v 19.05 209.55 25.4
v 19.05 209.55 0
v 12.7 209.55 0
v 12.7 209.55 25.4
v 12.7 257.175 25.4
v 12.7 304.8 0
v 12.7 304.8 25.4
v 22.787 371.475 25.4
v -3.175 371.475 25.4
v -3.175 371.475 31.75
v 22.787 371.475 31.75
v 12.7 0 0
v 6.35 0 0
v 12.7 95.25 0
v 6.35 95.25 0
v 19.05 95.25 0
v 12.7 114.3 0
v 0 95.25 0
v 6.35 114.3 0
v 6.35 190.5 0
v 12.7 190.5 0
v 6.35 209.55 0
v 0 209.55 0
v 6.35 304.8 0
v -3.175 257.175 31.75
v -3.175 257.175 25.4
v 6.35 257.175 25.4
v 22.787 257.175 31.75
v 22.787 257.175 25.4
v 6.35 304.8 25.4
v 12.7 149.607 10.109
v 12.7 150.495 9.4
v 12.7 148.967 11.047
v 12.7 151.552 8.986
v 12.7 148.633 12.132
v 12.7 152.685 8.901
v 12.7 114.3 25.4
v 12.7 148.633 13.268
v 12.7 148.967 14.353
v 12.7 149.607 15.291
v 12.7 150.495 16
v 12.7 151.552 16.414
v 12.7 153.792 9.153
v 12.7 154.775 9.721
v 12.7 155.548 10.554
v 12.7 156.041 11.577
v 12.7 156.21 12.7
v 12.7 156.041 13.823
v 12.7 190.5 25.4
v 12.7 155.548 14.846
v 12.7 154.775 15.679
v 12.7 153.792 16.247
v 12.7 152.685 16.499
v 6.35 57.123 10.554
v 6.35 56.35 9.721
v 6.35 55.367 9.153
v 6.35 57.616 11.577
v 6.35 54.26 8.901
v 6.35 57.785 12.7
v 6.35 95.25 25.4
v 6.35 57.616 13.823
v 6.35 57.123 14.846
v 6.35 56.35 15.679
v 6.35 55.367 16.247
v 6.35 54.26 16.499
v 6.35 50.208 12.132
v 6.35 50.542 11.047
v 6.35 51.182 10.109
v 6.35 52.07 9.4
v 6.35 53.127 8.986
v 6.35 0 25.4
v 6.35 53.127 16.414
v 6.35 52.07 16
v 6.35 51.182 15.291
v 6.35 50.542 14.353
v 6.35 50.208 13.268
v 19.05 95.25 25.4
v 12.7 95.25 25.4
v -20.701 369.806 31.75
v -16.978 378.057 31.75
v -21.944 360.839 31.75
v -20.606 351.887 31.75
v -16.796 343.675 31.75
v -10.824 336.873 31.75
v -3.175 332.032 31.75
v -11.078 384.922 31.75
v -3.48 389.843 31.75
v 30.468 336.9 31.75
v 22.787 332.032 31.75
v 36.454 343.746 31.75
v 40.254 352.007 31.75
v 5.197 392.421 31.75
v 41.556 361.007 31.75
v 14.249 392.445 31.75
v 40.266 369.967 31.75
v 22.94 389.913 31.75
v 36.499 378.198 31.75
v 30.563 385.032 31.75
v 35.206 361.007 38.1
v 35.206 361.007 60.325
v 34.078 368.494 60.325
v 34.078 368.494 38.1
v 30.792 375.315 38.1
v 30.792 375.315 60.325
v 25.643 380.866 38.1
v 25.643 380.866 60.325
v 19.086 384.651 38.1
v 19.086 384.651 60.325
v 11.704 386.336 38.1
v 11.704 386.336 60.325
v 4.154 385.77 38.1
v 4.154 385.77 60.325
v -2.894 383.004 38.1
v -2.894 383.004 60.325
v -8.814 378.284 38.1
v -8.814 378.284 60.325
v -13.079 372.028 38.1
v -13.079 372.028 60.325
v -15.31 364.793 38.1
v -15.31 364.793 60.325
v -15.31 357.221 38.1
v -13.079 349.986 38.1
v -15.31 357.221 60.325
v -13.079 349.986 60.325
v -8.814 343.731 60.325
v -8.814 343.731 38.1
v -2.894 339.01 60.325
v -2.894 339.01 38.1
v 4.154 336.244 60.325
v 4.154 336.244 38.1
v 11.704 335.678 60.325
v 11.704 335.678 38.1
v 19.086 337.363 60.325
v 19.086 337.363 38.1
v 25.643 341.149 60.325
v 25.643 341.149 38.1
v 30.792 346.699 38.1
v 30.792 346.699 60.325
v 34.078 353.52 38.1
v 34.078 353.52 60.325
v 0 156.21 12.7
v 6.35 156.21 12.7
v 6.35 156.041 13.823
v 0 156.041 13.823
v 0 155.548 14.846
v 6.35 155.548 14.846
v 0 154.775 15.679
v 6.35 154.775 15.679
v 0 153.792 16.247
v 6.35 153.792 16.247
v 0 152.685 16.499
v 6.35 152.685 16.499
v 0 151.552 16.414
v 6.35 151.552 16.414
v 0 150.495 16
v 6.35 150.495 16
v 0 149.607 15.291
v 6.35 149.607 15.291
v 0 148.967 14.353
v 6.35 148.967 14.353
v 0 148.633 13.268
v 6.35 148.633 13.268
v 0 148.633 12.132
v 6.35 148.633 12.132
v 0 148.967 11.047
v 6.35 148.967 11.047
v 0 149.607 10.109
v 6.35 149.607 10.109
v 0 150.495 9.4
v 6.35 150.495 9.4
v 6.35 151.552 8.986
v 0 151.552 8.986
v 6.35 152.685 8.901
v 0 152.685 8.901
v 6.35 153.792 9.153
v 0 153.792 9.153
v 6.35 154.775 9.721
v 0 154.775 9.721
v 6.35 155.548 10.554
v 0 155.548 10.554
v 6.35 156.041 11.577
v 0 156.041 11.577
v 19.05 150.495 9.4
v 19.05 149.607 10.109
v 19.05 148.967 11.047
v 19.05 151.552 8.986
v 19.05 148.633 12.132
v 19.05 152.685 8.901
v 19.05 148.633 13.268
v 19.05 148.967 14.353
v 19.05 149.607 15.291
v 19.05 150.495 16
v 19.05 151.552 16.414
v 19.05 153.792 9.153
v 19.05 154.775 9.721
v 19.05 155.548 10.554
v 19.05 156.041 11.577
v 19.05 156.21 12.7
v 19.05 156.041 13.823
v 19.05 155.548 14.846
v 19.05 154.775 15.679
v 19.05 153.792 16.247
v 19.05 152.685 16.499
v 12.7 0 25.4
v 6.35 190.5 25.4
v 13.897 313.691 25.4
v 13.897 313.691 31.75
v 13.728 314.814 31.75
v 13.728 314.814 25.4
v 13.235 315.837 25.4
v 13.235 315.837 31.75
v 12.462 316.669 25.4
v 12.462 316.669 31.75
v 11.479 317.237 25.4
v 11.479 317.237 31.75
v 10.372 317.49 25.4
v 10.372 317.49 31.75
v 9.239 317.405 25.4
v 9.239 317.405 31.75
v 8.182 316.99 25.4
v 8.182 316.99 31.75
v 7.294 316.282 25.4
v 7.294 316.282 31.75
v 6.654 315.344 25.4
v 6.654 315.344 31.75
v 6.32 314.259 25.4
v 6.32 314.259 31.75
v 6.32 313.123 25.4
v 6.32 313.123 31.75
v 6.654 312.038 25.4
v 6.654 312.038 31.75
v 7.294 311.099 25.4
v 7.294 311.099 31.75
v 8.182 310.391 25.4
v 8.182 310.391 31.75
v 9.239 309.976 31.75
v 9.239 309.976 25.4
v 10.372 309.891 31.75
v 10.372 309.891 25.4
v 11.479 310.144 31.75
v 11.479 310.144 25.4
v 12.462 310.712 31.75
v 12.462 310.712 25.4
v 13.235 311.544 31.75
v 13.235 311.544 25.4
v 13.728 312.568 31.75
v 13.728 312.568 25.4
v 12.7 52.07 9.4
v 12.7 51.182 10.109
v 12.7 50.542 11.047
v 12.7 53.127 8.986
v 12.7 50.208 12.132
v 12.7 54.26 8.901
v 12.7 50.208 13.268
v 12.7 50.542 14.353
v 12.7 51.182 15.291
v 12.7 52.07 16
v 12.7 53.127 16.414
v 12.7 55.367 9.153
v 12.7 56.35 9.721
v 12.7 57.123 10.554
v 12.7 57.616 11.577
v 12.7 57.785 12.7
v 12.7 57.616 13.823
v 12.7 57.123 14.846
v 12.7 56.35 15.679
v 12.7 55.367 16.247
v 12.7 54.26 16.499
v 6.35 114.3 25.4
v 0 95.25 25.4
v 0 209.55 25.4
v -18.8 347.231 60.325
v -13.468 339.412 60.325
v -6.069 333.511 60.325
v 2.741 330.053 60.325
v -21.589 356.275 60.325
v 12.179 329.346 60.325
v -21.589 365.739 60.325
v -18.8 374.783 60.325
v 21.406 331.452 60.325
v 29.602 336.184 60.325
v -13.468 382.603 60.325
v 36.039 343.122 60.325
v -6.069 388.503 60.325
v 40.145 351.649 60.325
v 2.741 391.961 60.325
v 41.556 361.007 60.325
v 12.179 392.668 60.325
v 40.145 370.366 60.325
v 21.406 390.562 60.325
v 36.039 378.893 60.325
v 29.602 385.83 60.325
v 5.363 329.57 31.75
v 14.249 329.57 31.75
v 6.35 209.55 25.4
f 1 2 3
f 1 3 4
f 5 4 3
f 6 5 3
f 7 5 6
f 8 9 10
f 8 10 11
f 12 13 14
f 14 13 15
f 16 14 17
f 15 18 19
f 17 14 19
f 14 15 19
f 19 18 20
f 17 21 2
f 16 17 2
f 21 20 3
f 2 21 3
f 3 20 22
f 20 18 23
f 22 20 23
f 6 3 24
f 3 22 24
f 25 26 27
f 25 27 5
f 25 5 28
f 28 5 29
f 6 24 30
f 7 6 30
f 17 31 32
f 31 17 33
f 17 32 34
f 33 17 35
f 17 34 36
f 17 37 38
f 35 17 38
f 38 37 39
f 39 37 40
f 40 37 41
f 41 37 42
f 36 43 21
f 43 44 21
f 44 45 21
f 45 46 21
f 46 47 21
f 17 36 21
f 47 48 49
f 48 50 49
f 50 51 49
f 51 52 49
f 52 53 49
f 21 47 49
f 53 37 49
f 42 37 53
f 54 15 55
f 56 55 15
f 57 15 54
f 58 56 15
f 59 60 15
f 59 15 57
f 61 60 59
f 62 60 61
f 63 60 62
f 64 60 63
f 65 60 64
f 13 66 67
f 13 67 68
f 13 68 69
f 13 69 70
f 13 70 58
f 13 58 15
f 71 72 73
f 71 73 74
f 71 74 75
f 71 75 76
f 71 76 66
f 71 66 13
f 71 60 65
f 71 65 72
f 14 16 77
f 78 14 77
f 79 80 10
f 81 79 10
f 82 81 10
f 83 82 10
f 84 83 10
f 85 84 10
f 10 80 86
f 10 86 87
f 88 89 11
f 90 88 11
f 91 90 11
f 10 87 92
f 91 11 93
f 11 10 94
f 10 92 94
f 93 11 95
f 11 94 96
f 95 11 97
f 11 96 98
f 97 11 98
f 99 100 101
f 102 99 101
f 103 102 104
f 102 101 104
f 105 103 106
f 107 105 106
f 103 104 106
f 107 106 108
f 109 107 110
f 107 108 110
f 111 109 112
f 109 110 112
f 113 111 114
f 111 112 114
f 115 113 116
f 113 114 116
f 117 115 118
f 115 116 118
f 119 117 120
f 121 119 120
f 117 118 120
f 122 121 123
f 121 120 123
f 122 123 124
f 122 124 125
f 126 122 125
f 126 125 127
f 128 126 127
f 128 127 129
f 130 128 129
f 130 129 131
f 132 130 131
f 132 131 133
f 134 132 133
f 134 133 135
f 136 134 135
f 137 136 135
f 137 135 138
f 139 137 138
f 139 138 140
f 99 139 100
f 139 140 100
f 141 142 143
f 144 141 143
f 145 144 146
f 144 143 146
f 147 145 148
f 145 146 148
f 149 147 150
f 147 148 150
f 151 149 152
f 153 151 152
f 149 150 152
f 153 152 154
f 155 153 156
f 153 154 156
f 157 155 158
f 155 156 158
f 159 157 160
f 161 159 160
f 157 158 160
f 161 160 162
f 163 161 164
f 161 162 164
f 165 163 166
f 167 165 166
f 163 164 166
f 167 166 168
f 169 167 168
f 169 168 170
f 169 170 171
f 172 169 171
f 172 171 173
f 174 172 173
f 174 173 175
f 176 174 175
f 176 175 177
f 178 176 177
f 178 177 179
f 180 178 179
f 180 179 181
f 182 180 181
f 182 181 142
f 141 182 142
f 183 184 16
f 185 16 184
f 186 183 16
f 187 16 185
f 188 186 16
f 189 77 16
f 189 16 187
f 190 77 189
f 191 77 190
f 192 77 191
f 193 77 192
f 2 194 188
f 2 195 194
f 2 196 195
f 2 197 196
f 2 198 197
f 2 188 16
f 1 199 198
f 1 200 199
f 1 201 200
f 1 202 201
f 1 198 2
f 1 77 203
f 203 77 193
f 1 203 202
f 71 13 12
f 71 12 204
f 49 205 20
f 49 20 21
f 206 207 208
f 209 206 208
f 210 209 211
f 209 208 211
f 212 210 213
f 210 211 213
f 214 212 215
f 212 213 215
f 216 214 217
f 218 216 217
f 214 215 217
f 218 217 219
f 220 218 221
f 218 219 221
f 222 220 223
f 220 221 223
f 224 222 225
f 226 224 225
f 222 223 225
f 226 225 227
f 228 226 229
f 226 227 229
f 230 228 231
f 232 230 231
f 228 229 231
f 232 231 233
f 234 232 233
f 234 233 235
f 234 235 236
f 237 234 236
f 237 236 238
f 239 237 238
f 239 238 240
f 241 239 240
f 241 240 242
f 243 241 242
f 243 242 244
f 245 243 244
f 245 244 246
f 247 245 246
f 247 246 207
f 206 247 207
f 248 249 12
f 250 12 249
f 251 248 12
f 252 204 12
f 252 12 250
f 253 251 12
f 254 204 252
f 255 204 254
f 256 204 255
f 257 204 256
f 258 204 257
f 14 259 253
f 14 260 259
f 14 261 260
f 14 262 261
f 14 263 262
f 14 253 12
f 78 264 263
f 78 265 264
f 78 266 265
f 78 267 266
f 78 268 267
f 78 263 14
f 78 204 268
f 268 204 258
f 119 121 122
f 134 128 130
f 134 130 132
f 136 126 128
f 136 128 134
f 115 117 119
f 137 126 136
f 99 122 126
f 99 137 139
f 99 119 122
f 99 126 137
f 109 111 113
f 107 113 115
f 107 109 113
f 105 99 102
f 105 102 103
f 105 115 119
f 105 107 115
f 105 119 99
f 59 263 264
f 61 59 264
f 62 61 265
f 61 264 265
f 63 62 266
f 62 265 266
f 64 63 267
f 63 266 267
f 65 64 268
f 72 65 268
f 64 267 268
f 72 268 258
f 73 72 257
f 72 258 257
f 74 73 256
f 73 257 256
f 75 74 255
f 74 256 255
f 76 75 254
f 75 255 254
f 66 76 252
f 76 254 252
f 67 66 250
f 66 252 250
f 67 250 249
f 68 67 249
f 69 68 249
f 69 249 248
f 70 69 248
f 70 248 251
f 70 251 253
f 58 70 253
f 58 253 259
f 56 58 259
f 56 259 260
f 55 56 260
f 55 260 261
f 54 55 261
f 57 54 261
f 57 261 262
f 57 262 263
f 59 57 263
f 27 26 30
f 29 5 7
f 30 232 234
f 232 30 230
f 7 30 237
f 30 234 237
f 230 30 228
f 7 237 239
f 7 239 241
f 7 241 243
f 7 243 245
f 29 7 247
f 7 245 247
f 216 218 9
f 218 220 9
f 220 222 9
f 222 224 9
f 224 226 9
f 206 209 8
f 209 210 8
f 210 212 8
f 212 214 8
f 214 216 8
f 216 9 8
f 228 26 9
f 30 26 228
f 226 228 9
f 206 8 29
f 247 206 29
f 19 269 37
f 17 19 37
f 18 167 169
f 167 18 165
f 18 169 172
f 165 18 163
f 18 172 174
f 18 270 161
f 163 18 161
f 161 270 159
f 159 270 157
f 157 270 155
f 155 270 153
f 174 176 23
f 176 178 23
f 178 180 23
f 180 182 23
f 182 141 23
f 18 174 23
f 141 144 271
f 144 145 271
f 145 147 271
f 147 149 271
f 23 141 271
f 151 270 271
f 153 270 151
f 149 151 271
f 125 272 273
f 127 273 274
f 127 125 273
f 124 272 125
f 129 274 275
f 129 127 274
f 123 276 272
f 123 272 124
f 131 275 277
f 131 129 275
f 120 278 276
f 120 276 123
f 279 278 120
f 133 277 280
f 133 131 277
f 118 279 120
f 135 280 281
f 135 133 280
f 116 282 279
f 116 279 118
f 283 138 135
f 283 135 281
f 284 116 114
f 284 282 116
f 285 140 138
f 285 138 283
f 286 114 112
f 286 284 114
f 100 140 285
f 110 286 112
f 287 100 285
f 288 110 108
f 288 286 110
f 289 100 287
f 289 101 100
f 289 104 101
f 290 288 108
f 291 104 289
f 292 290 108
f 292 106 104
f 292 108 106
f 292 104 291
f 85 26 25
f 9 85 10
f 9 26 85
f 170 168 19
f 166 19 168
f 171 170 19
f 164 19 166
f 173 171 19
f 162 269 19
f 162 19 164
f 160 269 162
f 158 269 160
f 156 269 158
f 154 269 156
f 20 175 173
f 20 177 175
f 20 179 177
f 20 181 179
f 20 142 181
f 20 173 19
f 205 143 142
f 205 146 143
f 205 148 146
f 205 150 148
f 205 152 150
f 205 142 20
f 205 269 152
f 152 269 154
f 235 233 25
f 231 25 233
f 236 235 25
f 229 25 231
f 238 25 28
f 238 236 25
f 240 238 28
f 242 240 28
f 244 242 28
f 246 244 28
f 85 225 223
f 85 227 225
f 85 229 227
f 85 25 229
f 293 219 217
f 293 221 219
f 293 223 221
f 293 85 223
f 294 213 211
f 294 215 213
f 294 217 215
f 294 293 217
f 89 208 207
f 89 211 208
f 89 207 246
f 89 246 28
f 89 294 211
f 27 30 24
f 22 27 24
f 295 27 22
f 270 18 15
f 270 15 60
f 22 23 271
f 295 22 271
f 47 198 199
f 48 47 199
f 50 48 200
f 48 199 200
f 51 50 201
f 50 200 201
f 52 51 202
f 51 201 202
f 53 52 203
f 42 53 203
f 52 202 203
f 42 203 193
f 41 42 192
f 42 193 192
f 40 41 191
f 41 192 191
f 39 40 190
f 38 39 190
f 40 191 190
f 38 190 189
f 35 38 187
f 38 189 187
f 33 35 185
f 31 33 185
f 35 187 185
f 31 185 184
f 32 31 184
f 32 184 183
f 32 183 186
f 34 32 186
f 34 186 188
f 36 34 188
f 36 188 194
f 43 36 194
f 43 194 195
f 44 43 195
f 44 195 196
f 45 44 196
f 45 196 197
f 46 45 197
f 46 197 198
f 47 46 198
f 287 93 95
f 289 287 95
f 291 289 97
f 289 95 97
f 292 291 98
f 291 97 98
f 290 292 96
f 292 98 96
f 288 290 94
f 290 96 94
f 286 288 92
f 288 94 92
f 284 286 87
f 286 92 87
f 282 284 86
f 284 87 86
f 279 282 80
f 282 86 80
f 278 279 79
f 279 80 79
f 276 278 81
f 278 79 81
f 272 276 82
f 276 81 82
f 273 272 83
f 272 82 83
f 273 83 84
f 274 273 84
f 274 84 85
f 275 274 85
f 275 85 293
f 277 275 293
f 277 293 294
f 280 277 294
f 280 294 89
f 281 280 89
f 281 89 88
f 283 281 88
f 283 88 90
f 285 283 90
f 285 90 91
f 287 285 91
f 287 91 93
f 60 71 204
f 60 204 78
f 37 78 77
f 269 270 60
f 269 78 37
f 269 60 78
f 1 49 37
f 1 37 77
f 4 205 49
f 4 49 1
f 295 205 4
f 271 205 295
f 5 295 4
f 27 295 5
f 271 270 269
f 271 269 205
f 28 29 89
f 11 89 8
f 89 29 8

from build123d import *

# Parameters (mm, degrees)
F0_W      = 304.8
F0_H      = 25.4
F1_DEPTH  = 19.05
F2_W      = 95.25
F2_H      = 25.4
F3_DEPTH  = 6.35
F4_W      = 95.25
F4_H      = 25.4
F5_DEPTH  = 6.35
F6_W      = 95.25
F6_H      = 25.4
F7_DEPTH  = 6.35
F8_W      = 95.25
F8_H      = 25.4
F9_DEPTH  = 6.35
F10_W     = 6.35
F10_H     = 76.2
F11_DEPTH = 25.4
F12_R     = 3.81
F13_DEPTH = 25.4
F14_W     = 25.961973
F14_H     = 114.3
F15_DEPTH = 6.35
F16_R     = 3.81
F17_DEPTH = 25.4
F18_R     = 3.81
F19_DEPTH = 25.4
F20_R     = 31.75
F21_DEPTH = 28.575
F22_R     = 25.4
F23_DEPTH = 22.225


with BuildPart() as f1:
    # F0 (on Right) → F1 (new body)
    with BuildSketch(Plane.YZ):
        with Locations((152.4, 12.7)):
            Rectangle(F0_W, F0_H)
    extrude(amount=F1_DEPTH)

    # F2 (on face) → F3 (cut)
    with BuildSketch(Plane.YZ.offset(19.05)):
        with Locations((47.625, 12.7)):
            Rectangle(F2_W, F2_H)
    extrude(amount=-F3_DEPTH, mode=Mode.SUBTRACT)

    # F4 (on face) → F5 (cut)
    with BuildSketch(Plane(origin=(0, 0, 0), x_dir=(0, -1, 0), z_dir=(-1, 0, 0))):
        with Locations((-47.625, 12.7)):
            Rectangle(F4_W, F4_H)
    extrude(amount=-F5_DEPTH, mode=Mode.SUBTRACT)

    # F6 (on face) → F7 (cut)
    with BuildSketch(Plane.YZ.offset(19.05)):
        with Locations((257.175, 12.7)):
            Rectangle(F6_W, F6_H)
    extrude(amount=-F7_DEPTH, mode=Mode.SUBTRACT)

    # F8 (on face) → F9 (cut)
    with BuildSketch(Plane(origin=(0, 0, 0), x_dir=(0, -1, 0), z_dir=(-1, 0, 0))):
        with Locations((-257.175, 12.7)):
            Rectangle(F8_W, F8_H)
    extrude(amount=-F9_DEPTH, mode=Mode.SUBTRACT)

    # F10 (on face) → F11 (cut)
    with BuildSketch(Plane.XY.offset(25.4)):
        with Locations((9.525, 152.4)):
            Rectangle(F10_W, F10_H)
    extrude(amount=-F11_DEPTH, mode=Mode.SUBTRACT)

    # F12 (on face) → F13 (cut)
    with BuildSketch(Plane.YZ.offset(19.05)):
        with Locations((152.4, 12.7)):
            Circle(F12_R)
    extrude(amount=-F13_DEPTH, mode=Mode.SUBTRACT)

    # F14 (on face) → F15 (join)
    with BuildSketch(Plane.XY.offset(25.4)):
        with Locations((9.805986, 314.325)):
            Rectangle(F14_W, F14_H)
    extrude(amount=F15_DEPTH)

    # F16 (on face) → F17 (cut)
    with BuildSketch(Plane.XY.offset(31.75)):
        with Locations((10.086973, 313.690683)):
            Circle(F16_R)
    extrude(amount=-F17_DEPTH, mode=Mode.SUBTRACT)

    # F18 (on face) → F19 (cut)
    with BuildSketch(Plane.YZ.offset(12.7)):
        with Locations((53.975, 12.7)):
            Circle(F18_R)
    extrude(amount=-F19_DEPTH, mode=Mode.SUBTRACT)

    # F20 (on face) → F21 (join)
    with BuildSketch(Plane.XY.offset(31.75)):
        with Locations((9.805986, 361.007124)):
            Circle(F20_R)
    extrude(amount=F21_DEPTH)

    # F22 (on face) → F23 (cut)
    with BuildSketch(Plane.XY.offset(60.325)):
        with Locations((9.805986, 361.007124)):
            Circle(F22_R)
    extrude(amount=-F23_DEPTH, mode=Mode.SUBTRACT)


solid = f1.part
